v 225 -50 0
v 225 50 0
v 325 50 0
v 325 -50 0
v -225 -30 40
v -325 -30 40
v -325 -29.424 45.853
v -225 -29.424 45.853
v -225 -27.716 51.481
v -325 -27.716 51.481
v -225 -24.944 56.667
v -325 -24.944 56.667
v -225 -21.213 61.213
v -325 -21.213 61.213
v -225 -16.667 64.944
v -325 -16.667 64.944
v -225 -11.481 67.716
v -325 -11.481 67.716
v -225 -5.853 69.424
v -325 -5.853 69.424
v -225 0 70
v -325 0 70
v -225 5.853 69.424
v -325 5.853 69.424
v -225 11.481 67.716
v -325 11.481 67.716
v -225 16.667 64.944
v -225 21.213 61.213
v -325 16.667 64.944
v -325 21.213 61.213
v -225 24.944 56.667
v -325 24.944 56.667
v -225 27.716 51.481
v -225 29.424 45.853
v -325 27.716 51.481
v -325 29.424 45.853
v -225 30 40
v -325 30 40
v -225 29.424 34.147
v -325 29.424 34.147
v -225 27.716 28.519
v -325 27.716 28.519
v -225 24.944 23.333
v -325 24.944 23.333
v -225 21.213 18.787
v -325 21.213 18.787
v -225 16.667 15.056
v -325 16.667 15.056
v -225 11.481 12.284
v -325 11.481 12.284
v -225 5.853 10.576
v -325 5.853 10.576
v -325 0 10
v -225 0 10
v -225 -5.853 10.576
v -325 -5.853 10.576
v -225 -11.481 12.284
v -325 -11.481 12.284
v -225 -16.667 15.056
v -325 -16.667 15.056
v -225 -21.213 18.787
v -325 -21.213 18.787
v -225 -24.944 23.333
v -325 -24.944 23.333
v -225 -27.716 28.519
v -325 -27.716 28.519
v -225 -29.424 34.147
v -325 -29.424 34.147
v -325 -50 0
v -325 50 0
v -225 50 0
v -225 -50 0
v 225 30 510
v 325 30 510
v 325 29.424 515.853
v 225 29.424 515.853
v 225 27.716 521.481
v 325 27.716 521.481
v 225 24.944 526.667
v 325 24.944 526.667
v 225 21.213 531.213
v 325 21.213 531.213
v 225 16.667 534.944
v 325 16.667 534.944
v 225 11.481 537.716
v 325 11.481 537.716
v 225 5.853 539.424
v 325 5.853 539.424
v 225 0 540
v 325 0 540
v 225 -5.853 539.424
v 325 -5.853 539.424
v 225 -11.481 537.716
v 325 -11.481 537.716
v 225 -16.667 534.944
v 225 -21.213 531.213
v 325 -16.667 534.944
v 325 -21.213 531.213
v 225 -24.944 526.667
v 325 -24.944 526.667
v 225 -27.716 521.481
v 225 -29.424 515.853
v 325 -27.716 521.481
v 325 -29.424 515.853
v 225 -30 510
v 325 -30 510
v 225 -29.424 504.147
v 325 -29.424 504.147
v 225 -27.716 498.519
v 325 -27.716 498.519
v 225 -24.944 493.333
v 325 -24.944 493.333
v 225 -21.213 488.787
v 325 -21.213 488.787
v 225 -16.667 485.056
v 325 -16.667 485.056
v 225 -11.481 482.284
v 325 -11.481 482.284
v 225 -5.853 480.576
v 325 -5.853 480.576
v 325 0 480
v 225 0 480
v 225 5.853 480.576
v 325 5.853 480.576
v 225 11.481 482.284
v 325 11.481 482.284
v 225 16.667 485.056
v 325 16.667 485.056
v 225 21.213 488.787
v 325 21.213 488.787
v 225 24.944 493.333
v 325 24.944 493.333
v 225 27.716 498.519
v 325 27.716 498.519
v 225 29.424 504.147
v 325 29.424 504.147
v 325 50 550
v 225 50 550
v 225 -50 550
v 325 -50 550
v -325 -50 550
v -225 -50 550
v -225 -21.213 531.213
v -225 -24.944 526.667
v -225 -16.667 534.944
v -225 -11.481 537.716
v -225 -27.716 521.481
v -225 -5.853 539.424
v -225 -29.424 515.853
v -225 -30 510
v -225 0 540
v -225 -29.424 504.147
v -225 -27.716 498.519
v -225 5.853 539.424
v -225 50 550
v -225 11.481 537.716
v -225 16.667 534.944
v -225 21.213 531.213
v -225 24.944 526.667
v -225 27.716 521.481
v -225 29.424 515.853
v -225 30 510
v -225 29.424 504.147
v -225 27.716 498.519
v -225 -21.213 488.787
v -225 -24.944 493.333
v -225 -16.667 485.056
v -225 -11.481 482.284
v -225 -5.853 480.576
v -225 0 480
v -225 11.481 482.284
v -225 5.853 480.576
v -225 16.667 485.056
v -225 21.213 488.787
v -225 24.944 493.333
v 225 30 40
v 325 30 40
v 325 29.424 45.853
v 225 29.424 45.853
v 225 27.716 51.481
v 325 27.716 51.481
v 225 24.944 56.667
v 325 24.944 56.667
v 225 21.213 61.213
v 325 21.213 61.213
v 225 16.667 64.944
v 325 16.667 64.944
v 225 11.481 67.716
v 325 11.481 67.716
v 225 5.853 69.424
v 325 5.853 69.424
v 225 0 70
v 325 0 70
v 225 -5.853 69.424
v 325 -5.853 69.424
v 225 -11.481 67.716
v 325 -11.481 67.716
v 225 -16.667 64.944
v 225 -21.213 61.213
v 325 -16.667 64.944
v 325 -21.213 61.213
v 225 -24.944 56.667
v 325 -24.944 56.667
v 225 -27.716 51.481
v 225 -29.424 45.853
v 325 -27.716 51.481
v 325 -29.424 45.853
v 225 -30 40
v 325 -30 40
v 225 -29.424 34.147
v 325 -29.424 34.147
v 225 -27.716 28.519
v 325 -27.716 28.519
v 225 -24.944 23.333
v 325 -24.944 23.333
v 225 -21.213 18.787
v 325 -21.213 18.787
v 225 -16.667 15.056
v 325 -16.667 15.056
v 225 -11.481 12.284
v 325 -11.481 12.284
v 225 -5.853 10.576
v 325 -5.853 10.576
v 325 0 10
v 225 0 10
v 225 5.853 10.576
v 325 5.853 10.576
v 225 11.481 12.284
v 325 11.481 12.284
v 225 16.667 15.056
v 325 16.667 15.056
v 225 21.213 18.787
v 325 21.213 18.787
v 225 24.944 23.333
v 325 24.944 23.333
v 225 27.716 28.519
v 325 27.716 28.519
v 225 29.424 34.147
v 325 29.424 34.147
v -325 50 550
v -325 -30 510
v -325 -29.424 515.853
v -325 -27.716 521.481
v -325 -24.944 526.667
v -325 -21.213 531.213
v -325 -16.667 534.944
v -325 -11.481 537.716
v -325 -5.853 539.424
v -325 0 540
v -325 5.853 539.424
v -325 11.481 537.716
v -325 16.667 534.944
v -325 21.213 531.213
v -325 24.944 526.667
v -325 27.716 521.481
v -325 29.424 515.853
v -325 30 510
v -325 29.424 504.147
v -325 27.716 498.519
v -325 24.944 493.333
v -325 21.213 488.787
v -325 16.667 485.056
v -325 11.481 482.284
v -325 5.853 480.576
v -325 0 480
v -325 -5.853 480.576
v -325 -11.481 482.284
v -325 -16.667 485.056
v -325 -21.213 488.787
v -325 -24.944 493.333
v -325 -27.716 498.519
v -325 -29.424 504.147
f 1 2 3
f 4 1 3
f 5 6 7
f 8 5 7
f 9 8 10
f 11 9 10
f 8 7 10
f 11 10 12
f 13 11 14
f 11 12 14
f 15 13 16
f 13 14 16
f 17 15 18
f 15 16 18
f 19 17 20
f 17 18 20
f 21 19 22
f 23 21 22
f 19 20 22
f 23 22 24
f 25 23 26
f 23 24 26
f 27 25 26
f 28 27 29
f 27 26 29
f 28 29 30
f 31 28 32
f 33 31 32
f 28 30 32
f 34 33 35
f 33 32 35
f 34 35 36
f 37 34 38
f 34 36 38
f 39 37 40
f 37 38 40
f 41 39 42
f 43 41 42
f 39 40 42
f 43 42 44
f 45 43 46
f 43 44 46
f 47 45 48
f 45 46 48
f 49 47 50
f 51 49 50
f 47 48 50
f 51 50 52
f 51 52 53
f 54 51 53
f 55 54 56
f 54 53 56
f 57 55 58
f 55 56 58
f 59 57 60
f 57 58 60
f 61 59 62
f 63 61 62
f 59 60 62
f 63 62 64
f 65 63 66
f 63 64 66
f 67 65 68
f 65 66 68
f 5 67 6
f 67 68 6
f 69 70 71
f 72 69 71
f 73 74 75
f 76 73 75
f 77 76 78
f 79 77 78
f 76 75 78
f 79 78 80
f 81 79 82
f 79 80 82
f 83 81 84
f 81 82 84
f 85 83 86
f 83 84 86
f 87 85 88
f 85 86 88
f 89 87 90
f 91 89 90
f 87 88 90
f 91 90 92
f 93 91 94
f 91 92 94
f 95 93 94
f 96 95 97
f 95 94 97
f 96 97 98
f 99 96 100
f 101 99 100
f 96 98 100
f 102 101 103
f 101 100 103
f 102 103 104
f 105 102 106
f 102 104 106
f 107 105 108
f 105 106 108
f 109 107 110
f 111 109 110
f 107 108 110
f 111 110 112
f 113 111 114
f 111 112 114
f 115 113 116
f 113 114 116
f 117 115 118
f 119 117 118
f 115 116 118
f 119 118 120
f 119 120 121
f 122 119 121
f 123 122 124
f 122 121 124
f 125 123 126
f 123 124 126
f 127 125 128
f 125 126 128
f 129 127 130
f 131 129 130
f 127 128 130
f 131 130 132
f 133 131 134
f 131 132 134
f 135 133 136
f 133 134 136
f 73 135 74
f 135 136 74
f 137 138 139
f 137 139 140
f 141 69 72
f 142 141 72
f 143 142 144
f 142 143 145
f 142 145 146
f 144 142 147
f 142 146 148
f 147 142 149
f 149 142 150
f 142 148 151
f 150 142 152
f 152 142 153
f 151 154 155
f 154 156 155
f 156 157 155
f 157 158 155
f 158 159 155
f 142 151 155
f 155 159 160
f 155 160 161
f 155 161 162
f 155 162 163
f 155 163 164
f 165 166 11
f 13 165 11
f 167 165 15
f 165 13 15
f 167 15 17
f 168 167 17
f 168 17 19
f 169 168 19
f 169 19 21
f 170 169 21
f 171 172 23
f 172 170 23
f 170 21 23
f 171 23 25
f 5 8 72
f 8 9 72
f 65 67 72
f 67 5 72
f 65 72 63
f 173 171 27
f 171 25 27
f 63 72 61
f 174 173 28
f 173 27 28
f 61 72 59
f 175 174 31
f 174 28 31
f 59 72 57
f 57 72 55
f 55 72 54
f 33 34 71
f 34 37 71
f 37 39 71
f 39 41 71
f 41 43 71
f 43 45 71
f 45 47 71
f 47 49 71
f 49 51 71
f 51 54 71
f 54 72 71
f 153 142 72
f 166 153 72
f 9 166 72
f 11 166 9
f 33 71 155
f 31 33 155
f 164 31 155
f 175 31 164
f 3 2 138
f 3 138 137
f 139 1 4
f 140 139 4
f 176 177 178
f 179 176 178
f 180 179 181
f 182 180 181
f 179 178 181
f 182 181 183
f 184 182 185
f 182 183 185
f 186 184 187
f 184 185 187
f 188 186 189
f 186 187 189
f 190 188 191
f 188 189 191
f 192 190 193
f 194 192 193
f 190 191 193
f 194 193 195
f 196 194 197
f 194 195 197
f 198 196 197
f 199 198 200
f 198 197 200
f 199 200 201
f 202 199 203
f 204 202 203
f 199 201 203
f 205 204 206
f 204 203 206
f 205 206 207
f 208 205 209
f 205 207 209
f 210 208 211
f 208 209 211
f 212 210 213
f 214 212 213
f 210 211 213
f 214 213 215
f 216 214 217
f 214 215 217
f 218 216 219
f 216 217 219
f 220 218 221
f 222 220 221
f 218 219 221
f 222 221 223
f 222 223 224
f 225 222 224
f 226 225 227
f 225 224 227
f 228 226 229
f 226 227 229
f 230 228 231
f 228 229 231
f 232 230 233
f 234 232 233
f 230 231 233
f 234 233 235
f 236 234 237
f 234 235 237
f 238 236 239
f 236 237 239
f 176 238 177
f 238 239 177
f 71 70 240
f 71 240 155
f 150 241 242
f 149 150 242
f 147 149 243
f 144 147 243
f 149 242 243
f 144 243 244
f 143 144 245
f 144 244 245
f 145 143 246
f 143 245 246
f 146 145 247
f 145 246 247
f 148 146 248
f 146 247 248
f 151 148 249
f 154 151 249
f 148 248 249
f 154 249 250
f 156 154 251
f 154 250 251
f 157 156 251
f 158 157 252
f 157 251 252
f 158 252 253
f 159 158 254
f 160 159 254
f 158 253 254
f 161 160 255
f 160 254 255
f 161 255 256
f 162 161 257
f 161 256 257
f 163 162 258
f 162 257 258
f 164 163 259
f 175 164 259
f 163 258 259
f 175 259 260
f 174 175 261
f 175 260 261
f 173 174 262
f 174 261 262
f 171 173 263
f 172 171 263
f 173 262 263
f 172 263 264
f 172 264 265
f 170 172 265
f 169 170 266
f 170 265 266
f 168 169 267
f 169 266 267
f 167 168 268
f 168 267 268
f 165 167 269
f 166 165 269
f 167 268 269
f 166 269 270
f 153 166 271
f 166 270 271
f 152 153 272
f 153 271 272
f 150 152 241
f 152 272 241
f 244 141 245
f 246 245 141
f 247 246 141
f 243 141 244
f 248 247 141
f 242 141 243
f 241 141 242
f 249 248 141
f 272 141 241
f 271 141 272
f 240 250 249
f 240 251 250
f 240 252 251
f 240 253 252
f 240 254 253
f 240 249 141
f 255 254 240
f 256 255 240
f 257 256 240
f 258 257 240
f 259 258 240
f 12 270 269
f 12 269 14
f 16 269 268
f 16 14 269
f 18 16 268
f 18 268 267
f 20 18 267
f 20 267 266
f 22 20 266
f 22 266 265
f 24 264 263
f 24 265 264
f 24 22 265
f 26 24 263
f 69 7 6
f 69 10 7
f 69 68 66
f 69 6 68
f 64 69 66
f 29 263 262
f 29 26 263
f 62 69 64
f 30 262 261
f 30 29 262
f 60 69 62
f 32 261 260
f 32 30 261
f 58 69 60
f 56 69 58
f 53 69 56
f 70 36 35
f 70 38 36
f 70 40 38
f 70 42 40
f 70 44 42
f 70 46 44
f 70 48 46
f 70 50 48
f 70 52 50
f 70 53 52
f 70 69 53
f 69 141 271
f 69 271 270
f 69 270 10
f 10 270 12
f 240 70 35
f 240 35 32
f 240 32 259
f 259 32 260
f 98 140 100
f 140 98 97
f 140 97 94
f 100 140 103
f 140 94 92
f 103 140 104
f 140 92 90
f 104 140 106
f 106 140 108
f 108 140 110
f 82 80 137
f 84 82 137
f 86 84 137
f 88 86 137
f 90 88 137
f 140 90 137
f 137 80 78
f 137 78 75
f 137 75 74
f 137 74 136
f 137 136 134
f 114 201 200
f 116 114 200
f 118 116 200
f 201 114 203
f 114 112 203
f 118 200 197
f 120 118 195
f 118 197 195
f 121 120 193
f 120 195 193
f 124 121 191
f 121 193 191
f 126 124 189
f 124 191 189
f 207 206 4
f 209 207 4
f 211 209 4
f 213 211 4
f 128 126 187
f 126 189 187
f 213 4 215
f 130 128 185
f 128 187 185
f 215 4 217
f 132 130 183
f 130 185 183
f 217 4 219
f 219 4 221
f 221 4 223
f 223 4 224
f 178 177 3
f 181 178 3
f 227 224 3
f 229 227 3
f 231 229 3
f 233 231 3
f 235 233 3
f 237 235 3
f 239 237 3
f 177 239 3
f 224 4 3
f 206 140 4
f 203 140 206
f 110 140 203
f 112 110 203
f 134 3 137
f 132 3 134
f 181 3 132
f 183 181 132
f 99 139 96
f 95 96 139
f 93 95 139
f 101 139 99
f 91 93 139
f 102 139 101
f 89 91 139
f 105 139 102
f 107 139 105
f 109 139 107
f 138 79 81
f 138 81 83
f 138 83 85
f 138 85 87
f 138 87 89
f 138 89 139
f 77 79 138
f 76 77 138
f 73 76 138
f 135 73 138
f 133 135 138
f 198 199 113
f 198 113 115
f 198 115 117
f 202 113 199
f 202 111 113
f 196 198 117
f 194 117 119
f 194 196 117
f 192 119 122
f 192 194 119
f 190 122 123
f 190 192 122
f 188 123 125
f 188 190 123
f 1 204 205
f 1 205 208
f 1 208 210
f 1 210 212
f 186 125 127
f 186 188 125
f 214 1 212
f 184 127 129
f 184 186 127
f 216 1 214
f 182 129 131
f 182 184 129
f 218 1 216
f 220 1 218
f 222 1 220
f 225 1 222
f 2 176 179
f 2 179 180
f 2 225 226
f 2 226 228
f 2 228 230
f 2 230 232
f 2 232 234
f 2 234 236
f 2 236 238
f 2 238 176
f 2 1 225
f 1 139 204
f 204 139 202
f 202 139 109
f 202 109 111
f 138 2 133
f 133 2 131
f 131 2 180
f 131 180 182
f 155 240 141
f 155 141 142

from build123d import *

# Parameters (mm, degrees)
F0_W     = 100
F0_H     = 100
F1_DEPTH = 550
F2_R     = 30
F3_DEPTH = 100
F4_R     = 30
F5_DEPTH = 100
F6_R     = 30
F7_DEPTH = 100
F8_R     = 30
F9_DEPTH = 100


with BuildPart() as f1:
    # F0 (on Top) → F1 (new body)
    with BuildSketch(Plane.XY):
        with Locations((-275, 0)):
            Rectangle(F0_W, F0_H)
        with Locations((275, 0)):
            Rectangle(F0_W, F0_H)
    extrude(amount=F1_DEPTH)

    # F2 (on face) → F3 (cut)
    with BuildSketch(Plane(origin=(-325, 0, 0), x_dir=(0, -1, 0), z_dir=(-1, 0, 0))):
        with Locations((0, 510)):
            Circle(F2_R)
    extrude(amount=-F3_DEPTH, mode=Mode.SUBTRACT)

    # F4 (on face) → F5 (cut)
    with BuildSketch(Plane.YZ.offset(325)):
        with Locations((0, 510)):
            Circle(F4_R)
    extrude(amount=-F5_DEPTH, mode=Mode.SUBTRACT)

    # F6 (on face) → F7 (cut)
    with BuildSketch(Plane(origin=(-325, 0, 0), x_dir=(0, -1, 0), z_dir=(-1, 0, 0))):
        with Locations((0, 40)):
            Circle(F6_R)
    extrude(amount=-F7_DEPTH, mode=Mode.SUBTRACT)

    # F8 (on face) → F9 (cut)
    with BuildSketch(Plane.YZ.offset(325)):
        with Locations((0, 40)):
            Circle(F8_R)
    extrude(amount=-F9_DEPTH, mode=Mode.SUBTRACT)


solid = f1.part
